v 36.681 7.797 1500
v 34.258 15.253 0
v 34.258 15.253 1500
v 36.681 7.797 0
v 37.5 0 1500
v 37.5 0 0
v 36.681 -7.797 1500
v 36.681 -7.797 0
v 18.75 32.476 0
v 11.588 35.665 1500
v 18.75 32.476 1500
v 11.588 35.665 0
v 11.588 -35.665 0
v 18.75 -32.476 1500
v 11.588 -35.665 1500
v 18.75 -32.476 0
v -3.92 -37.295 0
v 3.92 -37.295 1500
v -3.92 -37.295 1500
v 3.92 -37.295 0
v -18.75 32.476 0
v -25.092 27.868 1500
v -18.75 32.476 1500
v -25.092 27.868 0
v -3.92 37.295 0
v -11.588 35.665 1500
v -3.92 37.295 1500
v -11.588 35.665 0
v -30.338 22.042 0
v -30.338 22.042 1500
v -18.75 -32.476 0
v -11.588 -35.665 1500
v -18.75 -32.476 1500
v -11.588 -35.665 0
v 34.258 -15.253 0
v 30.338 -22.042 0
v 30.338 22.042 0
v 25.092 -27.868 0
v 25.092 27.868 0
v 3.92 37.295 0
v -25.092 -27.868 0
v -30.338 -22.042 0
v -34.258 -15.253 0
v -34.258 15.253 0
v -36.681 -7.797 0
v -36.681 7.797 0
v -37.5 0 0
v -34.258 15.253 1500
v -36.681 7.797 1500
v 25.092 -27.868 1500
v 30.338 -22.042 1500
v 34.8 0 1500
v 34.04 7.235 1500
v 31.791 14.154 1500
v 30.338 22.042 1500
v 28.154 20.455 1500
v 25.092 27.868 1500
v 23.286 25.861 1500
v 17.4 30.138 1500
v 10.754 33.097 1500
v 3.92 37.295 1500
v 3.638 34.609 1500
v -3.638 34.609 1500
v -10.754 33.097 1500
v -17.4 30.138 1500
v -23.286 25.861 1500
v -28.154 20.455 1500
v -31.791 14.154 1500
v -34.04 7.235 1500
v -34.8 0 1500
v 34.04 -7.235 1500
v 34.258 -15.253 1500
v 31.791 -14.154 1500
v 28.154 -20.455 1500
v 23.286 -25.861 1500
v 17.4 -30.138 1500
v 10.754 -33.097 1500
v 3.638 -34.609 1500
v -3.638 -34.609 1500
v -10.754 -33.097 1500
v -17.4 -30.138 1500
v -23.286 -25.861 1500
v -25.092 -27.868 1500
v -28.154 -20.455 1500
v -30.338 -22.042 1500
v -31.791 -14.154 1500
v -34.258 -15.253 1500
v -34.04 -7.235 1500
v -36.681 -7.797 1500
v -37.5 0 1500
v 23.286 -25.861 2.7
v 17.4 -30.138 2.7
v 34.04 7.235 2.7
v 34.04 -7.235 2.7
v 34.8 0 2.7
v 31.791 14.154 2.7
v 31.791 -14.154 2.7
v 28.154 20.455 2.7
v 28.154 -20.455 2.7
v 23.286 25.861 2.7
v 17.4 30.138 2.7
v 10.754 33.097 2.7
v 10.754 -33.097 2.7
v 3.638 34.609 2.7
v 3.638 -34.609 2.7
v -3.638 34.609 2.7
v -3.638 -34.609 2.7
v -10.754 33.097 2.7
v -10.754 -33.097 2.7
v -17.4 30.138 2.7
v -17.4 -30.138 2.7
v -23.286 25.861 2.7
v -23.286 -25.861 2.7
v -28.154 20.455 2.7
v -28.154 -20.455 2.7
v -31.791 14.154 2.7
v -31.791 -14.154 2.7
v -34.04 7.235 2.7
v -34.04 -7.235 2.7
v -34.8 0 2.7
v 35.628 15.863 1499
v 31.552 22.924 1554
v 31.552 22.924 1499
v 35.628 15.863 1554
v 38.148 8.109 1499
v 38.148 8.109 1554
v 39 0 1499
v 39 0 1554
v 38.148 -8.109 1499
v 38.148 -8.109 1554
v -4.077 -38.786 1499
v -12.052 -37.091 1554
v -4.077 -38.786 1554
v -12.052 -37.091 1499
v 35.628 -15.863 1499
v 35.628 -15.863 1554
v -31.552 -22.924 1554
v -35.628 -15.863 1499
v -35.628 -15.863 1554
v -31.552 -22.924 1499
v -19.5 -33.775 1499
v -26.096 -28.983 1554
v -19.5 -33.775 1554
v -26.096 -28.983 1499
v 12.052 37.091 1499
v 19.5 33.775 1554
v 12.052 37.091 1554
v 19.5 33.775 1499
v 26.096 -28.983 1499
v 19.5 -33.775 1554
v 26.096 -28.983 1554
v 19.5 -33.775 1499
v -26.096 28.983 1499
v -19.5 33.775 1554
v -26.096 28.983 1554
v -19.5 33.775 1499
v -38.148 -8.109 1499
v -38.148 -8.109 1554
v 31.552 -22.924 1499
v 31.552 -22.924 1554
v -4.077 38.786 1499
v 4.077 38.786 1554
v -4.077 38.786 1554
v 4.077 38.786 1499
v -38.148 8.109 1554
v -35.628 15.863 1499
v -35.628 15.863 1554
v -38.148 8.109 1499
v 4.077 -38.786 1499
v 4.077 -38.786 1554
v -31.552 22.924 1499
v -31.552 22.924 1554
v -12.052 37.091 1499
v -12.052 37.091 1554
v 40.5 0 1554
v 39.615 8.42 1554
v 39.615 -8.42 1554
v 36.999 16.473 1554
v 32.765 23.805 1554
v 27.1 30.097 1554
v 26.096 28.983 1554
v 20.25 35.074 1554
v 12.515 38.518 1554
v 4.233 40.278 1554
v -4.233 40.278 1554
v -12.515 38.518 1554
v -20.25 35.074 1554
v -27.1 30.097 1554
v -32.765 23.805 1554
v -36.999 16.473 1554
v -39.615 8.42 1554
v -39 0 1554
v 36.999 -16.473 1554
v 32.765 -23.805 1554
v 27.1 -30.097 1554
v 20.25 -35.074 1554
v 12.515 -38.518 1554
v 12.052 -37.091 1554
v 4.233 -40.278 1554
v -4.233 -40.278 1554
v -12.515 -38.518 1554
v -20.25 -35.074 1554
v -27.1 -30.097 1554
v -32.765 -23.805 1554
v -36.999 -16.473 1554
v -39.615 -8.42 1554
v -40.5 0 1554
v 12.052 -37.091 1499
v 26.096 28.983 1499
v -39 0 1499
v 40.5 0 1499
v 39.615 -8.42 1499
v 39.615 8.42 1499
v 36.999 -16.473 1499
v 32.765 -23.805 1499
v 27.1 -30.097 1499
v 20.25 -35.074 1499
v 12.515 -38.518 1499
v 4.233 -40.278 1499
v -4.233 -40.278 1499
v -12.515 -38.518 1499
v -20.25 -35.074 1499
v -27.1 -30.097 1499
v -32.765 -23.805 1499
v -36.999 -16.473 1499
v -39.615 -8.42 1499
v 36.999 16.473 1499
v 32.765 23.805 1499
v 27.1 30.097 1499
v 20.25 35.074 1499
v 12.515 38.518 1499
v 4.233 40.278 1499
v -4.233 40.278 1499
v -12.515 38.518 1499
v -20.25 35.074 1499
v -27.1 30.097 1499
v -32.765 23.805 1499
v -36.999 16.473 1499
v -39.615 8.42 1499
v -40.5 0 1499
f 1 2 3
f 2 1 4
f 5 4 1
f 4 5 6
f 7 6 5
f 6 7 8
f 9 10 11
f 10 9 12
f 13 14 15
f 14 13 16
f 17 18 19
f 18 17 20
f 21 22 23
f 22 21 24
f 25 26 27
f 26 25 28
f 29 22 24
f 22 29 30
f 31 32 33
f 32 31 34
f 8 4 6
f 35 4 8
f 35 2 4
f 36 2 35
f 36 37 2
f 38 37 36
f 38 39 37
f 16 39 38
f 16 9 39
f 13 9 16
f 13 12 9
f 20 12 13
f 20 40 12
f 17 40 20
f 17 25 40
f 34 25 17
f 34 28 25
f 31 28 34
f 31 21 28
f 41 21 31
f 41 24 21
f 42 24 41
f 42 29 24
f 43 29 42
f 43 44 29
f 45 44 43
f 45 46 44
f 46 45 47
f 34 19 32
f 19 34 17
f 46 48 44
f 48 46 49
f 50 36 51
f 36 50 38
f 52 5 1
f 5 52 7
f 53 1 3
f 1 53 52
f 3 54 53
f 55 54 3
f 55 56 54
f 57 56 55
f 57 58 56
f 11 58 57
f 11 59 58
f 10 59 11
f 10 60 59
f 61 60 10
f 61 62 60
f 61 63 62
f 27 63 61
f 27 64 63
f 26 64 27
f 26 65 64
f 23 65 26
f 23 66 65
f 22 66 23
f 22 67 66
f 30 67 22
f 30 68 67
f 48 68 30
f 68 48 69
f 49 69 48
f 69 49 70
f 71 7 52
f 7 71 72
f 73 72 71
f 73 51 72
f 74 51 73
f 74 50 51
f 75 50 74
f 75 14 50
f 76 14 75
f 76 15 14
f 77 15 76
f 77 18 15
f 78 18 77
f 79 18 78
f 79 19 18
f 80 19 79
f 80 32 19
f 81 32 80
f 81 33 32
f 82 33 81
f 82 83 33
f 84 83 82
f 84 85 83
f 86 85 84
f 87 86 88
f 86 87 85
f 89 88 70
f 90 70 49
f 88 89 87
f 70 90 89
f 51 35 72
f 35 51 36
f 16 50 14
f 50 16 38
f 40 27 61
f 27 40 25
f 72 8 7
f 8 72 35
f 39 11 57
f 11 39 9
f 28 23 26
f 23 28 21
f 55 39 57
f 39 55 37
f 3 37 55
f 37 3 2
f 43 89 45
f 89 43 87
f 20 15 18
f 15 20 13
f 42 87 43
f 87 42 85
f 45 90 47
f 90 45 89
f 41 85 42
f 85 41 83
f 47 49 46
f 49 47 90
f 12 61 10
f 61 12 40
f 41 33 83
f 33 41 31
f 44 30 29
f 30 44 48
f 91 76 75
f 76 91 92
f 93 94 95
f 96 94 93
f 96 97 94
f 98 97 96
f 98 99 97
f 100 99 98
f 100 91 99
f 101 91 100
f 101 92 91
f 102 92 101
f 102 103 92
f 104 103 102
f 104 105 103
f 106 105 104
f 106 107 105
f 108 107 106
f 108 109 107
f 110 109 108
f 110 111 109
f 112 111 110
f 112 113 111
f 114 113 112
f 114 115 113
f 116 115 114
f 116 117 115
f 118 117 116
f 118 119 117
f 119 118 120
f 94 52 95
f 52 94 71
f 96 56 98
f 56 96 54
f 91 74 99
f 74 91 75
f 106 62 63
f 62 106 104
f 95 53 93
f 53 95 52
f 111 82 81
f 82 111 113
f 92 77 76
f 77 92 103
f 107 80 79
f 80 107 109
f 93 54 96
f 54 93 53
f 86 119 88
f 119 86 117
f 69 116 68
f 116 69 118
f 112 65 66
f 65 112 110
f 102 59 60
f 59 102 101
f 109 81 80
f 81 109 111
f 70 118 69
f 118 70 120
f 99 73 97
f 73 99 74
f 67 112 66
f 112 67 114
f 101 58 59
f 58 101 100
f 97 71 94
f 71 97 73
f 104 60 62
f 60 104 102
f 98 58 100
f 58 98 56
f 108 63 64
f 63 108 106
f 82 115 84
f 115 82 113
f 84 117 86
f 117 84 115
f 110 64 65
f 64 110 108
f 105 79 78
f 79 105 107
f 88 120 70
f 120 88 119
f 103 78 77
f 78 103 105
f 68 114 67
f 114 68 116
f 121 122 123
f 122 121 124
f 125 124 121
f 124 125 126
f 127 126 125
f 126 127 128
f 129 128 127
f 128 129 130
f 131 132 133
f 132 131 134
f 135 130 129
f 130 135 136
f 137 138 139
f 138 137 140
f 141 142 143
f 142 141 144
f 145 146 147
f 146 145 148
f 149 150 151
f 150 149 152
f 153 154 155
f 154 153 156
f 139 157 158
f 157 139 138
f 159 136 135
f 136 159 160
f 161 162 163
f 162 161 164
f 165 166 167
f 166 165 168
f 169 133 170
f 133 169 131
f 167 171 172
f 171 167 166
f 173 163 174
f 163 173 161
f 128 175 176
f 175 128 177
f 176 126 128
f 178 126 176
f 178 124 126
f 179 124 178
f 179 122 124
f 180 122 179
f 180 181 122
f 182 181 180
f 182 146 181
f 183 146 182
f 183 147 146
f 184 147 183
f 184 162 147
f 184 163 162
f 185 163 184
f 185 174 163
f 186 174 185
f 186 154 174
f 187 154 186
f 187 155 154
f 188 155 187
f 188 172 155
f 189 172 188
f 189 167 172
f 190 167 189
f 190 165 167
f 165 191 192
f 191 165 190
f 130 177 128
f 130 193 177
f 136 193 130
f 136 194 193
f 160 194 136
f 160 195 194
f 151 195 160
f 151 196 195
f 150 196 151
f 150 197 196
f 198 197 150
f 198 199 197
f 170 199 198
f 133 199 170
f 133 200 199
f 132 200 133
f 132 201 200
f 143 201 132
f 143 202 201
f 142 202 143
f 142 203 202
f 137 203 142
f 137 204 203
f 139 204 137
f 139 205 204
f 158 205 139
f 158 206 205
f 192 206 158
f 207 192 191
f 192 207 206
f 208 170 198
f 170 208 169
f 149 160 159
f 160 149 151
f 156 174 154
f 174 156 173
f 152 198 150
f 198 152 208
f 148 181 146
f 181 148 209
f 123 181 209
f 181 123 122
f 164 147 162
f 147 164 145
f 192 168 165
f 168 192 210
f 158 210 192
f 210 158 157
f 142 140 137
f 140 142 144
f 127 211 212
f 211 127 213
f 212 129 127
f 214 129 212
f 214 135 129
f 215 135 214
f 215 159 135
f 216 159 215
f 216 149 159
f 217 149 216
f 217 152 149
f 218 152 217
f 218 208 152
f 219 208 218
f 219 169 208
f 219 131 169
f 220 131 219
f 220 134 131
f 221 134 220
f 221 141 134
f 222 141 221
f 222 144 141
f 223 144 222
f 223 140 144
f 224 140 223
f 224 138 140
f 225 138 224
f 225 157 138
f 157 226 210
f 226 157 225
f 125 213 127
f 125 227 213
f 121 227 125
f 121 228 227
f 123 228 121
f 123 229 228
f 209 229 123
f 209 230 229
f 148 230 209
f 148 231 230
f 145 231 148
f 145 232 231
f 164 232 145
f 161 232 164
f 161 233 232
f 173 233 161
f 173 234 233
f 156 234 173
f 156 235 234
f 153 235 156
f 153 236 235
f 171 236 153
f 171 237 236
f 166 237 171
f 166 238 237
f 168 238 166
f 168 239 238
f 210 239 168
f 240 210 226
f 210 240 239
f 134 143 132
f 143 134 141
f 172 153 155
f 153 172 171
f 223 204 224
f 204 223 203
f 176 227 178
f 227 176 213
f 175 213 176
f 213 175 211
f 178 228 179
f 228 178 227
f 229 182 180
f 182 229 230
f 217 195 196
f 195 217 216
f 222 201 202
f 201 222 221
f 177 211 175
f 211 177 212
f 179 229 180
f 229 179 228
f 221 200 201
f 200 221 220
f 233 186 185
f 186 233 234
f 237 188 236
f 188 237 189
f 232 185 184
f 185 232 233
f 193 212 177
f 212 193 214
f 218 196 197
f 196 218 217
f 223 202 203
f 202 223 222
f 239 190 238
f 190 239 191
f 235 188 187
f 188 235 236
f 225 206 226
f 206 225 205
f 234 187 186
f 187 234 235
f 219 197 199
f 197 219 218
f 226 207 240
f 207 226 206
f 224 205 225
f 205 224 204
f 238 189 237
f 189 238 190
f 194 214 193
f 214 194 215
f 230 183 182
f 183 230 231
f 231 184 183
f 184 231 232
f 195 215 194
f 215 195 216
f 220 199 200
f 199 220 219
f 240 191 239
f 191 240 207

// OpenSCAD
// Parameters
pipe_standard = 1; //[1:1:1]
nominal_diameter_mm = 75; //[40:150:1]
length_mm = 1500; //[750:3000:10]
center = 0; //[0:1:1]
ht75_outer_diameter_mm = 75; //[70:80:0.1]
ht75_wall_thickness_mm = 2.7; //[1.5:5.4:0.1]
fit_socket_length_mm = 55; //[30:110:1]
fit_outer_diameter_extra_mm = 6; //[3:12:0.5]
fit_wall_extra_mm = 1.5; //[0.5:3:0.1]
fit_stop_ring_length_mm = 6; //[3:15:0.5]
fit_stop_ring_radial_mm = 2; //[1:5:0.1]
overlap_mm = 1; //[0.5:2:0.1]

// HT Pipe - complete geometry
module ht_pipe() {
  color([0.85, 0.85, 0.8]) {
    // Pipe body
    difference() {
      cylinder(r=ht75_outer_diameter_mm/2, h=length_mm, center=false);
      translate([0, 0, ht75_wall_thickness_mm])
        cylinder(r=ht75_outer_diameter_mm/2 - ht75_wall_thickness_mm, h=length_mm, center=false);
    }
    
    // End fitting
    difference() {
      translate([0, 0, length_mm - overlap_mm])
        cylinder(r=(ht75_outer_diameter_mm + fit_outer_diameter_extra_mm)/2, h=fit_socket_length_mm, center=false);
      
      union() {
        translate([0, 0, length_mm - overlap_mm])
          cylinder(r=ht75_outer_diameter_mm/2 + fit_wall_extra_mm, h=fit_socket_length_mm, center=false);
        
        translate([0, 0, length_mm - overlap_mm + fit_socket_length_mm - fit_stop_ring_length_mm])
          cylinder(r=ht75_outer_diameter_mm/2 + fit_wall_extra_mm - fit_stop_ring_radial_mm, h=fit_stop_ring_length_mm, center=false);
      }
    }
  }
}

// Assembly
module assembly() {
  ht_pipe();
}

assembly();
